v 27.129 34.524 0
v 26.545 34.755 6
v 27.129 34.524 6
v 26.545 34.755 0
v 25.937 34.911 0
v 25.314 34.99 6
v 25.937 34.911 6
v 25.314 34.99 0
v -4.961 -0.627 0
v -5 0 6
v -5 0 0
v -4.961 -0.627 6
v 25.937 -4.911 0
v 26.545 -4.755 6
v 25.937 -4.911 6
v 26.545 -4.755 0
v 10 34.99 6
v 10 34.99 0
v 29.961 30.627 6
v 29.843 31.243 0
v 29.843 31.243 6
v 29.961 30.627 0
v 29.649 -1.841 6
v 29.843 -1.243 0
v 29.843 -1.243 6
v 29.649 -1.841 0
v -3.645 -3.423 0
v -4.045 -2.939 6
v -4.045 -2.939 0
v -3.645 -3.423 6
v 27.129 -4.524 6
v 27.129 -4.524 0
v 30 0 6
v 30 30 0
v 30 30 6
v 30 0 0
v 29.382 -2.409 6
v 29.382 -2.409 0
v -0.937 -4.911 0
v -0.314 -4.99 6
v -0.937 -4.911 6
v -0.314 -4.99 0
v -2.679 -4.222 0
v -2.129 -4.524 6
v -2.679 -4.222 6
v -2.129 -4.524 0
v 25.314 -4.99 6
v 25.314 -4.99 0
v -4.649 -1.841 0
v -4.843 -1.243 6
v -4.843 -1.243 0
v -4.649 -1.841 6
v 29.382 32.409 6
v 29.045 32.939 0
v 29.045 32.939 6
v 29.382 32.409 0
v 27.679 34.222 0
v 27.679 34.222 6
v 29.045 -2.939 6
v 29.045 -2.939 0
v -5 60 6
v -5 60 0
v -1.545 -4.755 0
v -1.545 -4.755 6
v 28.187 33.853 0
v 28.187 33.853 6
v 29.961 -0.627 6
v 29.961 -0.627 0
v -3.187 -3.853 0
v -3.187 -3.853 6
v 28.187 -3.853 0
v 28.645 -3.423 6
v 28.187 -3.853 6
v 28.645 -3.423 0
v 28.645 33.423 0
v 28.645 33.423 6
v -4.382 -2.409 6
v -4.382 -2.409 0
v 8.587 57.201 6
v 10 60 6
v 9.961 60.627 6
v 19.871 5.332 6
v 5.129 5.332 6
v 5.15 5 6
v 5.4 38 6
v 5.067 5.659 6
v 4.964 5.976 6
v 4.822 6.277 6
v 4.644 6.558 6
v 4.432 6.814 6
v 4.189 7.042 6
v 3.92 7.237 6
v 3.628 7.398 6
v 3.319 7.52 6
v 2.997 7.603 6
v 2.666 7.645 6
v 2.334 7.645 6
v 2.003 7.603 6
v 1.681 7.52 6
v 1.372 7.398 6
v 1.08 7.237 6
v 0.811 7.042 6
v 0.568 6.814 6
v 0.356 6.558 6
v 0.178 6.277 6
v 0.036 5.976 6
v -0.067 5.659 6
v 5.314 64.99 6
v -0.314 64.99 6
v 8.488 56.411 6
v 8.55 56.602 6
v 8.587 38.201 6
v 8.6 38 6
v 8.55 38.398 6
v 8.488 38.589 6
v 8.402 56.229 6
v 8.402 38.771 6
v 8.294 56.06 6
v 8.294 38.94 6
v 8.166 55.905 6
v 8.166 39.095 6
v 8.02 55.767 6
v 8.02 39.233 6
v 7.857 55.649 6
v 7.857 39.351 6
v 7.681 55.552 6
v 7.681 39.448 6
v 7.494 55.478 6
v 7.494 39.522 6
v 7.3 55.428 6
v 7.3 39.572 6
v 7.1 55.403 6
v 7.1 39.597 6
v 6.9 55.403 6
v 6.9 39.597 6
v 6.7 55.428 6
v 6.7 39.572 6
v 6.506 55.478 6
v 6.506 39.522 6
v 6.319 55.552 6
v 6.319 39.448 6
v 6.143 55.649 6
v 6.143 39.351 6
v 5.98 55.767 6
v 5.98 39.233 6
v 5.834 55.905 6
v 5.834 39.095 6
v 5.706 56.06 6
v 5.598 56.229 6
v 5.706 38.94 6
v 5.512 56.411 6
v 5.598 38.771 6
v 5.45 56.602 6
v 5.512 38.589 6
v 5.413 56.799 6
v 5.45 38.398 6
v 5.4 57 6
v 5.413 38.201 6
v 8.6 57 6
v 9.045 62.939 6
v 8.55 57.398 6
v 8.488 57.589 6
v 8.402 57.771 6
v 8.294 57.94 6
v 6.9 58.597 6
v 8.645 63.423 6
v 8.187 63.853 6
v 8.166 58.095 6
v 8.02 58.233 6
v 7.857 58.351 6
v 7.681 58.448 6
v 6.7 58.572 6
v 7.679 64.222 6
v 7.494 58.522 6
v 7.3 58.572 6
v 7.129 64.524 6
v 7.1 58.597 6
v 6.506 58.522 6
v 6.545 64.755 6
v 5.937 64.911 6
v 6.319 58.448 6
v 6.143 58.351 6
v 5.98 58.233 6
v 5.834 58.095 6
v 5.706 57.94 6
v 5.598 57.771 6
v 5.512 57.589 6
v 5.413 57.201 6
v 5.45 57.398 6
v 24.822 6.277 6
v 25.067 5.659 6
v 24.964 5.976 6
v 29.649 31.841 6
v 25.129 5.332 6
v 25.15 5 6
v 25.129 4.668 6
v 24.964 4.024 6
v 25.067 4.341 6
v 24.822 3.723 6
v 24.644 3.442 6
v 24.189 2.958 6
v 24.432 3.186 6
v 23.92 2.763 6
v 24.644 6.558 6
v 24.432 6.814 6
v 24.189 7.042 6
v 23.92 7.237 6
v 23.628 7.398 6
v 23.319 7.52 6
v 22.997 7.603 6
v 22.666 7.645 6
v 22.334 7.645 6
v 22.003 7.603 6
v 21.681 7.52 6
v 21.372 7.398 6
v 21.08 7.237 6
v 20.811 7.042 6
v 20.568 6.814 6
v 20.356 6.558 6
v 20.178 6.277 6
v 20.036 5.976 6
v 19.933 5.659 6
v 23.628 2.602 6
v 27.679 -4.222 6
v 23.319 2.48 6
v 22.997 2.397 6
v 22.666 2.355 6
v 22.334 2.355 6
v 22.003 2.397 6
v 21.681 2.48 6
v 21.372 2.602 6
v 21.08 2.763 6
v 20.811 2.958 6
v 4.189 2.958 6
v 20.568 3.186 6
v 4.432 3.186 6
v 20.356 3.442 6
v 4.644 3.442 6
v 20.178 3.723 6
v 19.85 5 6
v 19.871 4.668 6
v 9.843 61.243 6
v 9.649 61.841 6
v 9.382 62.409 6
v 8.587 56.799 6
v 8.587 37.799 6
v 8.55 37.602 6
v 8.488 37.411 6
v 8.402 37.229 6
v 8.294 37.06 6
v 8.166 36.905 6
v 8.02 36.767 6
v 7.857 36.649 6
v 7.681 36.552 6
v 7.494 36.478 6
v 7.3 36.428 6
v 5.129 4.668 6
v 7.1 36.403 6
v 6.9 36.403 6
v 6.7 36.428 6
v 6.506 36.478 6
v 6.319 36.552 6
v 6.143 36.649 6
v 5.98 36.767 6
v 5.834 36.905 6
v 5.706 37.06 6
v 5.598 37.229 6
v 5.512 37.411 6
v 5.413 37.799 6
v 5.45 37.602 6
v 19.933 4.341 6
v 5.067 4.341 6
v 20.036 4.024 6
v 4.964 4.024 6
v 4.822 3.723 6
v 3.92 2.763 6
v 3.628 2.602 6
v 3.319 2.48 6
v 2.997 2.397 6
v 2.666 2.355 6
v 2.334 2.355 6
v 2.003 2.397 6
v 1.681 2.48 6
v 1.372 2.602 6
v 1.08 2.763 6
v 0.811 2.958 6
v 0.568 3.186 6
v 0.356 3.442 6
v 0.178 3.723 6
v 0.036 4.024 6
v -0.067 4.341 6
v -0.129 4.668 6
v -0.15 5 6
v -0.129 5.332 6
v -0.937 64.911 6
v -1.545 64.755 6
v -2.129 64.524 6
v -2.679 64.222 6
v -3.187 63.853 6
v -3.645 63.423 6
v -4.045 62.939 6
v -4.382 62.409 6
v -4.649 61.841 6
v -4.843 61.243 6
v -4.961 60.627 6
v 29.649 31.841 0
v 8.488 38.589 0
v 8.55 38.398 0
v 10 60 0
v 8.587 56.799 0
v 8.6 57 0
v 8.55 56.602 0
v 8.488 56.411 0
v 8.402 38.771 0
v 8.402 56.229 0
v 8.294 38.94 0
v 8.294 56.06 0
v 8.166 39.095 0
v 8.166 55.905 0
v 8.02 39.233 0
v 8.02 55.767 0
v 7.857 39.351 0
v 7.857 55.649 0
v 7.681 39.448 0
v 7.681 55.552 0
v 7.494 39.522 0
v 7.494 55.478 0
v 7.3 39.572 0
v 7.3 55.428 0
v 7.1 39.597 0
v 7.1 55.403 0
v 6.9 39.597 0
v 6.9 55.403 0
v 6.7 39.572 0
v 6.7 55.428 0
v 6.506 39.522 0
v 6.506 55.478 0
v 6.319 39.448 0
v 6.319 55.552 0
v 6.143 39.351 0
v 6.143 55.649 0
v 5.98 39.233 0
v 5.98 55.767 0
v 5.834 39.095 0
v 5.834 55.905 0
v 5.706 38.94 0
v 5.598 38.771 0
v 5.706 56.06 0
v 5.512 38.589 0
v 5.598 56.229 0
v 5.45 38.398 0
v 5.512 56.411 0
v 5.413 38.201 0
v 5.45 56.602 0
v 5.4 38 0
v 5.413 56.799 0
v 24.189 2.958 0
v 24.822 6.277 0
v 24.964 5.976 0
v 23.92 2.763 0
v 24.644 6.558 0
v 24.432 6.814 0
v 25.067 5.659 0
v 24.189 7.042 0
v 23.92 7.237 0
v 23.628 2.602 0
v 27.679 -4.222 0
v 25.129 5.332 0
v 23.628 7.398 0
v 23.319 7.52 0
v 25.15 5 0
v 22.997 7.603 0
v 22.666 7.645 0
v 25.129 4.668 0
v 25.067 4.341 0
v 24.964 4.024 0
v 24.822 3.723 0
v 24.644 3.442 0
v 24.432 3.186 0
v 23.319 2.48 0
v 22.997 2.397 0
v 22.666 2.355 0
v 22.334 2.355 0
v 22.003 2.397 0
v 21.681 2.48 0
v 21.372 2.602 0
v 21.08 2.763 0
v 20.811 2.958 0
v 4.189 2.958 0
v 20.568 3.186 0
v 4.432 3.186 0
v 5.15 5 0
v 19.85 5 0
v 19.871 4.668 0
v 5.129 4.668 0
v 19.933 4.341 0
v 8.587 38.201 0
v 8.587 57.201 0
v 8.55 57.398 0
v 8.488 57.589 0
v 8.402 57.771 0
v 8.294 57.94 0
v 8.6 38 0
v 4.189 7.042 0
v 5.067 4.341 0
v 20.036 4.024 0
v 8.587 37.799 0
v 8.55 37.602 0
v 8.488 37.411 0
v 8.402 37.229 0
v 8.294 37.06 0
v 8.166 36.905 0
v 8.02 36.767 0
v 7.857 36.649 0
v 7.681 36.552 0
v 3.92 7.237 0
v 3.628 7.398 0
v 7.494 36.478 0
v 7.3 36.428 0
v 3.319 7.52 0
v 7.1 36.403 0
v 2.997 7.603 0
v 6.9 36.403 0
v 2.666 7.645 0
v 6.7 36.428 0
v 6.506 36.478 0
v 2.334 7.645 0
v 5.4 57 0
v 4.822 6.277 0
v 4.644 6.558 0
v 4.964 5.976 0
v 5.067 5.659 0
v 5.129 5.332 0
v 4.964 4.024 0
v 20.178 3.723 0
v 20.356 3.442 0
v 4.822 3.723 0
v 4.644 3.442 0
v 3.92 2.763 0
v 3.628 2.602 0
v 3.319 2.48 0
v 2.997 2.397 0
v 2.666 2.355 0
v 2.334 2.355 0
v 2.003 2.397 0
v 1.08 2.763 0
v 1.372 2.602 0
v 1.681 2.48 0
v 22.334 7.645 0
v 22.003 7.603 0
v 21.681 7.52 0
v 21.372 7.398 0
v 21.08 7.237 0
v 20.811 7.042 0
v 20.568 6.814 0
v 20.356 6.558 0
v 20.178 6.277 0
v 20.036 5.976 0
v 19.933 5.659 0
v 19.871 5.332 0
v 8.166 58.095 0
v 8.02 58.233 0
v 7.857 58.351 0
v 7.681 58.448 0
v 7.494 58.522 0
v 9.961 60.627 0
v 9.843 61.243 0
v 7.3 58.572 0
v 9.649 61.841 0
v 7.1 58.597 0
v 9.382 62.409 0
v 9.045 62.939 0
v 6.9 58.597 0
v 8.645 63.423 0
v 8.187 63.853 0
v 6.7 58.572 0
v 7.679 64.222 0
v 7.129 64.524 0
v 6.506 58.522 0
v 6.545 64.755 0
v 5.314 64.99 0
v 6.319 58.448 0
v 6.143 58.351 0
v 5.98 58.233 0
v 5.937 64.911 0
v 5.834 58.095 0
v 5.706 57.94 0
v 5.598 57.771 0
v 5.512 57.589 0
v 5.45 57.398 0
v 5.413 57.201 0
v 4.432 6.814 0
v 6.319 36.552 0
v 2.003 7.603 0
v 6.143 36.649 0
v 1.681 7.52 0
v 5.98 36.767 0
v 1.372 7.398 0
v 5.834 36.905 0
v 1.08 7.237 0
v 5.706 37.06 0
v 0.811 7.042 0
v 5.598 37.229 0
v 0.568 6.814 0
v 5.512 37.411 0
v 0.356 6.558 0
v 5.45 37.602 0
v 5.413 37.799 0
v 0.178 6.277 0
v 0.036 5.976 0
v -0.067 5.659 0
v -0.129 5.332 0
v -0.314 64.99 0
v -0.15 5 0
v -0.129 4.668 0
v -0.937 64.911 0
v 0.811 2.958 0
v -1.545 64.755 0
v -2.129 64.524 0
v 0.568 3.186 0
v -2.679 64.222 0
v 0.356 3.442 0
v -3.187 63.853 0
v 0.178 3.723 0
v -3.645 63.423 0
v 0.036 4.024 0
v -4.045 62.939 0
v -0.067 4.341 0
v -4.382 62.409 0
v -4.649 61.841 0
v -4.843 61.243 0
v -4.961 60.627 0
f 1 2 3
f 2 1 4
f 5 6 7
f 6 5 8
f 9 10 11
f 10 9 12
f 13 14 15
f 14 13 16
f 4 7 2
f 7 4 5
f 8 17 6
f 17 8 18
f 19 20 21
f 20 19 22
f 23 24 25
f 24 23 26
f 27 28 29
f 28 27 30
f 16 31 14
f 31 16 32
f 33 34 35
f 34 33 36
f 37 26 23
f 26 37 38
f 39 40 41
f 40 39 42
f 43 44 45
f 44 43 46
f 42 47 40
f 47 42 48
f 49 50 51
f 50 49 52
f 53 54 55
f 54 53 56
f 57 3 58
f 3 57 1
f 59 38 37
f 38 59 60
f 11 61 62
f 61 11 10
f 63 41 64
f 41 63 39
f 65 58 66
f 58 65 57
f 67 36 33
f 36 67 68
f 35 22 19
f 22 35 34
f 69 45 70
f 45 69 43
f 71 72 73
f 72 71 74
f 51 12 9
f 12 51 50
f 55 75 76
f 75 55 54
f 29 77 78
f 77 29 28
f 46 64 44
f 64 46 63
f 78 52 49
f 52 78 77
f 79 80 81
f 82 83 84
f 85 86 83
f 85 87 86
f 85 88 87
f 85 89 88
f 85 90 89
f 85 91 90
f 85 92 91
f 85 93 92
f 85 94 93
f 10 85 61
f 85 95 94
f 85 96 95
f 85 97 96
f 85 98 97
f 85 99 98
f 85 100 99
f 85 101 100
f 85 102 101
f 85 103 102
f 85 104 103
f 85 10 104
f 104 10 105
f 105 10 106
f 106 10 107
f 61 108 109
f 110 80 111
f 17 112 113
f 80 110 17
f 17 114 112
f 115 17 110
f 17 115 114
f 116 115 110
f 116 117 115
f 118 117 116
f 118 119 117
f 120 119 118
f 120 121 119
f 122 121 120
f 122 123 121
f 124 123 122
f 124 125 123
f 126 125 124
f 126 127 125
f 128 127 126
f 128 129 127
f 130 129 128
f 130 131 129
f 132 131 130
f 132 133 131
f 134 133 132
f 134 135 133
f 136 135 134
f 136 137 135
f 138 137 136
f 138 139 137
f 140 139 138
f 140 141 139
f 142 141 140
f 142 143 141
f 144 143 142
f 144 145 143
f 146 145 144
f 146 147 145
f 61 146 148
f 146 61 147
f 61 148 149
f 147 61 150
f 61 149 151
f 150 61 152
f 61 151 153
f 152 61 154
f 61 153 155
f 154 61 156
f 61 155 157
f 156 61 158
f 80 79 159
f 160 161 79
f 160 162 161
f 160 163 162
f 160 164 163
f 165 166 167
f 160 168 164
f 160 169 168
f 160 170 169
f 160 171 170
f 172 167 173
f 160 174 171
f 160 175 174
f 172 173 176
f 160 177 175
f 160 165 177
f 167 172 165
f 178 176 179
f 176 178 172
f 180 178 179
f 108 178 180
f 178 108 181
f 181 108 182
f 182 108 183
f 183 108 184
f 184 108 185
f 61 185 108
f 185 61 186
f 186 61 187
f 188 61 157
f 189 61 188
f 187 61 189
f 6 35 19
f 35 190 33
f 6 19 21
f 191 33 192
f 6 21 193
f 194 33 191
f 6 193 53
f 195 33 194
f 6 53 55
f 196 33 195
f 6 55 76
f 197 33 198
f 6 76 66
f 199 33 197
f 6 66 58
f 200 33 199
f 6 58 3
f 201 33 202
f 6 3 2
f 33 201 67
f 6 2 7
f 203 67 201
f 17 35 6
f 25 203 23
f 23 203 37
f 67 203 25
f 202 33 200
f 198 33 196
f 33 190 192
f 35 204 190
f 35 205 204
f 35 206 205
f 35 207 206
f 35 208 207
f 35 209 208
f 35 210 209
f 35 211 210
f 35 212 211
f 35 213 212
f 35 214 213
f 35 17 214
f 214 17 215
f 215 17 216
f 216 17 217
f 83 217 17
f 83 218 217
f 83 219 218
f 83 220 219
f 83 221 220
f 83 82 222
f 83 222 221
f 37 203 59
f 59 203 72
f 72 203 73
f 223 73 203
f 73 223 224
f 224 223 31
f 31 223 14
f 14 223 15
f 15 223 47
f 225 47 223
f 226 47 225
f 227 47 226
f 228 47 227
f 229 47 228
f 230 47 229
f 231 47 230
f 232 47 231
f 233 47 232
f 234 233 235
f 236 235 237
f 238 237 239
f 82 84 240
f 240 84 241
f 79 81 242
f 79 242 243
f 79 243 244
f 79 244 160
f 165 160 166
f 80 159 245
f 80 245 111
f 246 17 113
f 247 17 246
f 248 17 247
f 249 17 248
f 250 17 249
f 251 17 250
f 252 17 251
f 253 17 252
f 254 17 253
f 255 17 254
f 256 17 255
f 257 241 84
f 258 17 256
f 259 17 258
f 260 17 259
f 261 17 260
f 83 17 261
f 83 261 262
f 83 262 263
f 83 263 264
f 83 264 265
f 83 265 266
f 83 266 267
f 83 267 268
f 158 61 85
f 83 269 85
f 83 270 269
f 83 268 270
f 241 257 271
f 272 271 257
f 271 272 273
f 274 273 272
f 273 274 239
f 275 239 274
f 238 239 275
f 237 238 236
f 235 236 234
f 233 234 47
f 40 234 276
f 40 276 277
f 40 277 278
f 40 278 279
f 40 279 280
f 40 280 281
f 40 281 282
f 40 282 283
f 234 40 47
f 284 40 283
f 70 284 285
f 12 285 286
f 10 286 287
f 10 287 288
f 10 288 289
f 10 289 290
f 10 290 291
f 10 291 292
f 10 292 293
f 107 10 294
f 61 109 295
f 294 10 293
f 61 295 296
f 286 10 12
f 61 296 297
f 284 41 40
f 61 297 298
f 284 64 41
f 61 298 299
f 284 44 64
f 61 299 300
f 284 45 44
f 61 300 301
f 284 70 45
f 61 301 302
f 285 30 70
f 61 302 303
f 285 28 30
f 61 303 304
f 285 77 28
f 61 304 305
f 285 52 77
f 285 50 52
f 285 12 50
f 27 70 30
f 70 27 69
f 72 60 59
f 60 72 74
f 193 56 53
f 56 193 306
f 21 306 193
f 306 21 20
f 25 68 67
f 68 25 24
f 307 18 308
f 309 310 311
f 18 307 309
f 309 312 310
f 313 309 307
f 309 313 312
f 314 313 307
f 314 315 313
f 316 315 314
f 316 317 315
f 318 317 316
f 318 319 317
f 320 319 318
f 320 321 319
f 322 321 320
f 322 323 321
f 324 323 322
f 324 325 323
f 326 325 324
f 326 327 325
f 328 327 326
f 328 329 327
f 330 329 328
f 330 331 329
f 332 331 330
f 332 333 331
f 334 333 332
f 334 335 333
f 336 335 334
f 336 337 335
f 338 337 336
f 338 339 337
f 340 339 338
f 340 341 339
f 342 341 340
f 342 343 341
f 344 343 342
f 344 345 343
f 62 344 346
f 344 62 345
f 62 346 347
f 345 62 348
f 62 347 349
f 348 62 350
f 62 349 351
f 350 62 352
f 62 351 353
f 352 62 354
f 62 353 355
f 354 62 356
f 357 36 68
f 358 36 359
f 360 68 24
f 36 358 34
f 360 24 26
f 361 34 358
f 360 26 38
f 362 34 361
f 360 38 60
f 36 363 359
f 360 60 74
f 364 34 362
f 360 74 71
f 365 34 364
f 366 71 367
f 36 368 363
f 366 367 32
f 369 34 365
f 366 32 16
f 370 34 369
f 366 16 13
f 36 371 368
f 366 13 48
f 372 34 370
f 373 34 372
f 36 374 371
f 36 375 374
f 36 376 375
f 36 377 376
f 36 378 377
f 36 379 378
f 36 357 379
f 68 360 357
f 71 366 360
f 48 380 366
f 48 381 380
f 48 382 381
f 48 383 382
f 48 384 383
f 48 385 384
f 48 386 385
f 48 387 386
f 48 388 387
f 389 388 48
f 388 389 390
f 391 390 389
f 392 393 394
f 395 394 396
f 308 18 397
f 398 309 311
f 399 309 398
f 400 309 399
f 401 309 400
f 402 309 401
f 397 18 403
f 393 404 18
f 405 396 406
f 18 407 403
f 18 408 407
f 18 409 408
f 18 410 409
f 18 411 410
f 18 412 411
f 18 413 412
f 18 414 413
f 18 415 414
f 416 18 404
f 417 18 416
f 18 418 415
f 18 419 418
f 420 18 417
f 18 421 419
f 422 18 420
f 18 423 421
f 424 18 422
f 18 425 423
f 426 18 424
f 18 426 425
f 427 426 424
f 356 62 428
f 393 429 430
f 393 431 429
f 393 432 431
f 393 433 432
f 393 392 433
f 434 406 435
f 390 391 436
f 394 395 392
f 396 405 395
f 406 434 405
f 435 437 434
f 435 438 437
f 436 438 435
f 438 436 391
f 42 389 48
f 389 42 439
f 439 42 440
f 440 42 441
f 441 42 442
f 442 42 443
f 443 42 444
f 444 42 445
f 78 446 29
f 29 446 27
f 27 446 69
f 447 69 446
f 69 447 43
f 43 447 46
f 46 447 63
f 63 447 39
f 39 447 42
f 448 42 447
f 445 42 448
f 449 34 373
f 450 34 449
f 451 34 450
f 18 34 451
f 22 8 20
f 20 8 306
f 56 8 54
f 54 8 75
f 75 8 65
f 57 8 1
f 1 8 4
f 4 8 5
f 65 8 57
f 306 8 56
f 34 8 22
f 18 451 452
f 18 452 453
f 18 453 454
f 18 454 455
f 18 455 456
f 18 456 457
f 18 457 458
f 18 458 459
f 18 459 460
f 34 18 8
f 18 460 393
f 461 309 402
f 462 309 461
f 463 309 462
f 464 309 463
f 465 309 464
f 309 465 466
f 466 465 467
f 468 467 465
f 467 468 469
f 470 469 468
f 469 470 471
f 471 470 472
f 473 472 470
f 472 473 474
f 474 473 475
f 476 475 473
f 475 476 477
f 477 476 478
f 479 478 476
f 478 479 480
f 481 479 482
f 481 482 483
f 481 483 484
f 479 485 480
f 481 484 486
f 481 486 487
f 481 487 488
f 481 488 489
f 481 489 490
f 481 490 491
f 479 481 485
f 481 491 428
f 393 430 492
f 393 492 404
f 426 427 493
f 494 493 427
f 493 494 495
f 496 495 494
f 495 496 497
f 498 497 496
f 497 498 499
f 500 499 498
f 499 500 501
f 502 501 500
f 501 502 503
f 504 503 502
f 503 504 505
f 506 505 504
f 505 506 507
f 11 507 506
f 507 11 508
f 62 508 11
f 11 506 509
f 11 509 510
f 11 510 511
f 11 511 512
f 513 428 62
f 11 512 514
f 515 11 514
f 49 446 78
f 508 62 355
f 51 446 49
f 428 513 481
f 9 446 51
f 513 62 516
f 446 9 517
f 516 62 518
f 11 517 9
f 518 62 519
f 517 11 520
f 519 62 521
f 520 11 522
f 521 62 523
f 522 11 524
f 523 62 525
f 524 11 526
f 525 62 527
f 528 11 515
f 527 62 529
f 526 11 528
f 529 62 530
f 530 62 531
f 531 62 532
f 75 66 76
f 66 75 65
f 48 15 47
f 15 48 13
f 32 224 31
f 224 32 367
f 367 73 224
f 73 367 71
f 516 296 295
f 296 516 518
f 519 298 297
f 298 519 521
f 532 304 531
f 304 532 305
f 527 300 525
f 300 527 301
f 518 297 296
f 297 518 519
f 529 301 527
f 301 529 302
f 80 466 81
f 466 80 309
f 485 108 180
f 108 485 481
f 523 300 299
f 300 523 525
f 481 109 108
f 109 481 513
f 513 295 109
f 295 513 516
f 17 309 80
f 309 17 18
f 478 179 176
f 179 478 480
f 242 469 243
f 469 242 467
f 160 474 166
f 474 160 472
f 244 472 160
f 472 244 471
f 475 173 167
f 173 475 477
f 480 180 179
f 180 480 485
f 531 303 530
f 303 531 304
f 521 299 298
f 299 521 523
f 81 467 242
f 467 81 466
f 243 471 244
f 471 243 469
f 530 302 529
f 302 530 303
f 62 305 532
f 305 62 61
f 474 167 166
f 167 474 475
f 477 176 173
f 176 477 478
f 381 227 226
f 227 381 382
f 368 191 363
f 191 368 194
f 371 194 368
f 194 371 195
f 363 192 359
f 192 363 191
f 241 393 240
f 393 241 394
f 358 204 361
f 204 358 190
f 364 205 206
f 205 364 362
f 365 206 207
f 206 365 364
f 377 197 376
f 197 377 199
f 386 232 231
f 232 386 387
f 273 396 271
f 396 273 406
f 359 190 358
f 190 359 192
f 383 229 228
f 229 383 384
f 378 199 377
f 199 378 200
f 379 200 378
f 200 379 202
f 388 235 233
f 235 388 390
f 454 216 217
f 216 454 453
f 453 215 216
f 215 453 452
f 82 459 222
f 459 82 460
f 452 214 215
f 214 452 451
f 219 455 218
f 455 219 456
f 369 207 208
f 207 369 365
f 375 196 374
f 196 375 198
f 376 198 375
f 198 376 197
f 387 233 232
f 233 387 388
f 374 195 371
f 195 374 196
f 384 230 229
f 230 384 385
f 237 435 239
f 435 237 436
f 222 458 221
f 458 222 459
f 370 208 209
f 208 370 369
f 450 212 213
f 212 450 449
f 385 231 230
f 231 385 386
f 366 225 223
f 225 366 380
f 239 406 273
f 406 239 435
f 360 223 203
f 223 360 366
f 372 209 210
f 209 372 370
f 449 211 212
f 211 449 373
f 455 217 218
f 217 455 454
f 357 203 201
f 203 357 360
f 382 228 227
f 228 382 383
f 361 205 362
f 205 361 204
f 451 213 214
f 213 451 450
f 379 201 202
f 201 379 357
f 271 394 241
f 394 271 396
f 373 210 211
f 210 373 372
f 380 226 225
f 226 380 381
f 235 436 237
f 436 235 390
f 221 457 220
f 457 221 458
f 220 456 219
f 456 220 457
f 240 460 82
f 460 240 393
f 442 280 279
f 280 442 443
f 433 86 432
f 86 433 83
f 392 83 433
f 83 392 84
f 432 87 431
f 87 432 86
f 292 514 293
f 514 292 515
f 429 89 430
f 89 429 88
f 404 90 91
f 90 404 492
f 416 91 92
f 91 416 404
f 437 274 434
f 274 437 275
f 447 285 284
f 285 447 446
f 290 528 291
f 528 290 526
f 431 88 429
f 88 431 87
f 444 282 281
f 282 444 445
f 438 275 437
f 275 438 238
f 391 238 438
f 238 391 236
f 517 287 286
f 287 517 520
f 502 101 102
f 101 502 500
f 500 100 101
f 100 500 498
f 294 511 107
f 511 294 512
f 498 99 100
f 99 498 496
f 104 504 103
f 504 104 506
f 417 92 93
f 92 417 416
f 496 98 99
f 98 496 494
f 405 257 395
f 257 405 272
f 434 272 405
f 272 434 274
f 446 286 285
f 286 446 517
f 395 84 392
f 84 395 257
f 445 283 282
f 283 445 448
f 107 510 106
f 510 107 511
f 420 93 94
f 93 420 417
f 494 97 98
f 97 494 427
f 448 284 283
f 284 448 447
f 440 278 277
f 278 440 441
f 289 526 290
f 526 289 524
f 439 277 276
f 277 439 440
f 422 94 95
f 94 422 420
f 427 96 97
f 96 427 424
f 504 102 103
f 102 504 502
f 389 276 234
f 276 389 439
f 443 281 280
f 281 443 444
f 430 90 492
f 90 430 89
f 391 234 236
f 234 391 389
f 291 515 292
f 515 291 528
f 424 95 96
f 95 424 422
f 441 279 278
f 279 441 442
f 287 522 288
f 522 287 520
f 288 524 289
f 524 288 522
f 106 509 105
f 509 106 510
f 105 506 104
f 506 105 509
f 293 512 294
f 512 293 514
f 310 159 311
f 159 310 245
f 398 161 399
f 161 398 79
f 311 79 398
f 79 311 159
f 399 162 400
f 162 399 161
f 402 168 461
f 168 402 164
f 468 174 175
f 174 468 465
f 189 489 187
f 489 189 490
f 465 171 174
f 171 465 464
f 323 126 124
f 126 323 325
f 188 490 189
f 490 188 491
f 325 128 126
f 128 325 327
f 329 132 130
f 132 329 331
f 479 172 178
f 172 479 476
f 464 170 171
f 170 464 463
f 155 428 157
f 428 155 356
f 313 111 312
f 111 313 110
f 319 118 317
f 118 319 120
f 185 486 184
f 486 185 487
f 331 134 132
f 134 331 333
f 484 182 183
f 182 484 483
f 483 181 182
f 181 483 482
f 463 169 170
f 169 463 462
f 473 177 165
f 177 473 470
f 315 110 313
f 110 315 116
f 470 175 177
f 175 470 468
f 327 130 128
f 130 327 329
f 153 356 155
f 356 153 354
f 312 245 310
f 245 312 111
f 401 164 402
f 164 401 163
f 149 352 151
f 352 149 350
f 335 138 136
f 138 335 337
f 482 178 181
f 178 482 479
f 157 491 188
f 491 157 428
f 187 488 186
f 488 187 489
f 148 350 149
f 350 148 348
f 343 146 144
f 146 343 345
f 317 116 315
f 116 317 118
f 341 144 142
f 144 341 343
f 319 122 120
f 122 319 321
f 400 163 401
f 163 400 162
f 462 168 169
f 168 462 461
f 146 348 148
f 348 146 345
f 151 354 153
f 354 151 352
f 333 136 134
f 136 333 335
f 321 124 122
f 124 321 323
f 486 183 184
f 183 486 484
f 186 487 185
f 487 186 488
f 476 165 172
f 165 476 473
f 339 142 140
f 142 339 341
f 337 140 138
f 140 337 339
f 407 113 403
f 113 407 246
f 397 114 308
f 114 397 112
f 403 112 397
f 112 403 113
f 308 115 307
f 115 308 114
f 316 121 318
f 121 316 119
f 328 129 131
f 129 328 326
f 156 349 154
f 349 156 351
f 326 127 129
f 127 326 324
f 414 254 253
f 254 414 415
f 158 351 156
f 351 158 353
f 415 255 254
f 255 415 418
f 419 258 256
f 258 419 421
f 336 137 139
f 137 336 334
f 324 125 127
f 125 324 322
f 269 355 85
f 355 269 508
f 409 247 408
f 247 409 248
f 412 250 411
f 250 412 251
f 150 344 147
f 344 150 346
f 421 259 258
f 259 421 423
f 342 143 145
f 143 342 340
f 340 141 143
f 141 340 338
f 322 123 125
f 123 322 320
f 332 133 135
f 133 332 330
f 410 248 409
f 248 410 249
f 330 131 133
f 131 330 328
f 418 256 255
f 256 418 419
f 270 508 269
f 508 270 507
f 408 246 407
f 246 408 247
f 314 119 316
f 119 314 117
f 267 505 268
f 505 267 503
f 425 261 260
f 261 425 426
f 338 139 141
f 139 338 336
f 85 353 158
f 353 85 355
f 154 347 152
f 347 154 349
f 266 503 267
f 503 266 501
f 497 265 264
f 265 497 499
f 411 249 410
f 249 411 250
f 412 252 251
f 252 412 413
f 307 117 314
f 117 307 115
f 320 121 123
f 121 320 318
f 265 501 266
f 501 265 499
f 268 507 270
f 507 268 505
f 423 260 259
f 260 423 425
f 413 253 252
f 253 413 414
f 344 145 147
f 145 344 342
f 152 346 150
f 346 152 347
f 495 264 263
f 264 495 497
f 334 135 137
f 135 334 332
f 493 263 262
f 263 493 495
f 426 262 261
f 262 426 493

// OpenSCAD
$fn=50;
$drill3=3.2;
$drill5=5.3;
$thickness=6;
$width=25;
$length=60;

difference() {
    union() {
        hull() {
            translate([0,0,0]) cylinder(r=5,h=$thickness);
            translate([0,30,0]) cylinder(r=5,h=$thickness);
            translate([$width,0,0]) cylinder(r=5,h=$thickness);
            translate([$width,30,0]) cylinder(r=5,h=$thickness);
        }
        hull() {
            translate([0,0,0]) cylinder(r=5,h=$thickness);
            translate([0,$length,0]) cylinder(r=5,h=$thickness);
            translate([5,0,0]) cylinder(r=5,h=$thickness);
            translate([5,$length,0]) cylinder(r=5,h=$thickness);
        }
    }
    translate([$width/2+10,5,-1]) cylinder(r=$drill5/2,h=$thickness+2);
    translate([$width/2-10,5,-1]) cylinder(r=$drill5/2,h=$thickness+2);

    translate([7,$length+2-5,-1]) cylinder(r=$drill3/2,h=$thickness+2);
    translate([7,$length+2-5-19,-1]) cylinder(r=$drill3/2,h=$thickness+2);
}
